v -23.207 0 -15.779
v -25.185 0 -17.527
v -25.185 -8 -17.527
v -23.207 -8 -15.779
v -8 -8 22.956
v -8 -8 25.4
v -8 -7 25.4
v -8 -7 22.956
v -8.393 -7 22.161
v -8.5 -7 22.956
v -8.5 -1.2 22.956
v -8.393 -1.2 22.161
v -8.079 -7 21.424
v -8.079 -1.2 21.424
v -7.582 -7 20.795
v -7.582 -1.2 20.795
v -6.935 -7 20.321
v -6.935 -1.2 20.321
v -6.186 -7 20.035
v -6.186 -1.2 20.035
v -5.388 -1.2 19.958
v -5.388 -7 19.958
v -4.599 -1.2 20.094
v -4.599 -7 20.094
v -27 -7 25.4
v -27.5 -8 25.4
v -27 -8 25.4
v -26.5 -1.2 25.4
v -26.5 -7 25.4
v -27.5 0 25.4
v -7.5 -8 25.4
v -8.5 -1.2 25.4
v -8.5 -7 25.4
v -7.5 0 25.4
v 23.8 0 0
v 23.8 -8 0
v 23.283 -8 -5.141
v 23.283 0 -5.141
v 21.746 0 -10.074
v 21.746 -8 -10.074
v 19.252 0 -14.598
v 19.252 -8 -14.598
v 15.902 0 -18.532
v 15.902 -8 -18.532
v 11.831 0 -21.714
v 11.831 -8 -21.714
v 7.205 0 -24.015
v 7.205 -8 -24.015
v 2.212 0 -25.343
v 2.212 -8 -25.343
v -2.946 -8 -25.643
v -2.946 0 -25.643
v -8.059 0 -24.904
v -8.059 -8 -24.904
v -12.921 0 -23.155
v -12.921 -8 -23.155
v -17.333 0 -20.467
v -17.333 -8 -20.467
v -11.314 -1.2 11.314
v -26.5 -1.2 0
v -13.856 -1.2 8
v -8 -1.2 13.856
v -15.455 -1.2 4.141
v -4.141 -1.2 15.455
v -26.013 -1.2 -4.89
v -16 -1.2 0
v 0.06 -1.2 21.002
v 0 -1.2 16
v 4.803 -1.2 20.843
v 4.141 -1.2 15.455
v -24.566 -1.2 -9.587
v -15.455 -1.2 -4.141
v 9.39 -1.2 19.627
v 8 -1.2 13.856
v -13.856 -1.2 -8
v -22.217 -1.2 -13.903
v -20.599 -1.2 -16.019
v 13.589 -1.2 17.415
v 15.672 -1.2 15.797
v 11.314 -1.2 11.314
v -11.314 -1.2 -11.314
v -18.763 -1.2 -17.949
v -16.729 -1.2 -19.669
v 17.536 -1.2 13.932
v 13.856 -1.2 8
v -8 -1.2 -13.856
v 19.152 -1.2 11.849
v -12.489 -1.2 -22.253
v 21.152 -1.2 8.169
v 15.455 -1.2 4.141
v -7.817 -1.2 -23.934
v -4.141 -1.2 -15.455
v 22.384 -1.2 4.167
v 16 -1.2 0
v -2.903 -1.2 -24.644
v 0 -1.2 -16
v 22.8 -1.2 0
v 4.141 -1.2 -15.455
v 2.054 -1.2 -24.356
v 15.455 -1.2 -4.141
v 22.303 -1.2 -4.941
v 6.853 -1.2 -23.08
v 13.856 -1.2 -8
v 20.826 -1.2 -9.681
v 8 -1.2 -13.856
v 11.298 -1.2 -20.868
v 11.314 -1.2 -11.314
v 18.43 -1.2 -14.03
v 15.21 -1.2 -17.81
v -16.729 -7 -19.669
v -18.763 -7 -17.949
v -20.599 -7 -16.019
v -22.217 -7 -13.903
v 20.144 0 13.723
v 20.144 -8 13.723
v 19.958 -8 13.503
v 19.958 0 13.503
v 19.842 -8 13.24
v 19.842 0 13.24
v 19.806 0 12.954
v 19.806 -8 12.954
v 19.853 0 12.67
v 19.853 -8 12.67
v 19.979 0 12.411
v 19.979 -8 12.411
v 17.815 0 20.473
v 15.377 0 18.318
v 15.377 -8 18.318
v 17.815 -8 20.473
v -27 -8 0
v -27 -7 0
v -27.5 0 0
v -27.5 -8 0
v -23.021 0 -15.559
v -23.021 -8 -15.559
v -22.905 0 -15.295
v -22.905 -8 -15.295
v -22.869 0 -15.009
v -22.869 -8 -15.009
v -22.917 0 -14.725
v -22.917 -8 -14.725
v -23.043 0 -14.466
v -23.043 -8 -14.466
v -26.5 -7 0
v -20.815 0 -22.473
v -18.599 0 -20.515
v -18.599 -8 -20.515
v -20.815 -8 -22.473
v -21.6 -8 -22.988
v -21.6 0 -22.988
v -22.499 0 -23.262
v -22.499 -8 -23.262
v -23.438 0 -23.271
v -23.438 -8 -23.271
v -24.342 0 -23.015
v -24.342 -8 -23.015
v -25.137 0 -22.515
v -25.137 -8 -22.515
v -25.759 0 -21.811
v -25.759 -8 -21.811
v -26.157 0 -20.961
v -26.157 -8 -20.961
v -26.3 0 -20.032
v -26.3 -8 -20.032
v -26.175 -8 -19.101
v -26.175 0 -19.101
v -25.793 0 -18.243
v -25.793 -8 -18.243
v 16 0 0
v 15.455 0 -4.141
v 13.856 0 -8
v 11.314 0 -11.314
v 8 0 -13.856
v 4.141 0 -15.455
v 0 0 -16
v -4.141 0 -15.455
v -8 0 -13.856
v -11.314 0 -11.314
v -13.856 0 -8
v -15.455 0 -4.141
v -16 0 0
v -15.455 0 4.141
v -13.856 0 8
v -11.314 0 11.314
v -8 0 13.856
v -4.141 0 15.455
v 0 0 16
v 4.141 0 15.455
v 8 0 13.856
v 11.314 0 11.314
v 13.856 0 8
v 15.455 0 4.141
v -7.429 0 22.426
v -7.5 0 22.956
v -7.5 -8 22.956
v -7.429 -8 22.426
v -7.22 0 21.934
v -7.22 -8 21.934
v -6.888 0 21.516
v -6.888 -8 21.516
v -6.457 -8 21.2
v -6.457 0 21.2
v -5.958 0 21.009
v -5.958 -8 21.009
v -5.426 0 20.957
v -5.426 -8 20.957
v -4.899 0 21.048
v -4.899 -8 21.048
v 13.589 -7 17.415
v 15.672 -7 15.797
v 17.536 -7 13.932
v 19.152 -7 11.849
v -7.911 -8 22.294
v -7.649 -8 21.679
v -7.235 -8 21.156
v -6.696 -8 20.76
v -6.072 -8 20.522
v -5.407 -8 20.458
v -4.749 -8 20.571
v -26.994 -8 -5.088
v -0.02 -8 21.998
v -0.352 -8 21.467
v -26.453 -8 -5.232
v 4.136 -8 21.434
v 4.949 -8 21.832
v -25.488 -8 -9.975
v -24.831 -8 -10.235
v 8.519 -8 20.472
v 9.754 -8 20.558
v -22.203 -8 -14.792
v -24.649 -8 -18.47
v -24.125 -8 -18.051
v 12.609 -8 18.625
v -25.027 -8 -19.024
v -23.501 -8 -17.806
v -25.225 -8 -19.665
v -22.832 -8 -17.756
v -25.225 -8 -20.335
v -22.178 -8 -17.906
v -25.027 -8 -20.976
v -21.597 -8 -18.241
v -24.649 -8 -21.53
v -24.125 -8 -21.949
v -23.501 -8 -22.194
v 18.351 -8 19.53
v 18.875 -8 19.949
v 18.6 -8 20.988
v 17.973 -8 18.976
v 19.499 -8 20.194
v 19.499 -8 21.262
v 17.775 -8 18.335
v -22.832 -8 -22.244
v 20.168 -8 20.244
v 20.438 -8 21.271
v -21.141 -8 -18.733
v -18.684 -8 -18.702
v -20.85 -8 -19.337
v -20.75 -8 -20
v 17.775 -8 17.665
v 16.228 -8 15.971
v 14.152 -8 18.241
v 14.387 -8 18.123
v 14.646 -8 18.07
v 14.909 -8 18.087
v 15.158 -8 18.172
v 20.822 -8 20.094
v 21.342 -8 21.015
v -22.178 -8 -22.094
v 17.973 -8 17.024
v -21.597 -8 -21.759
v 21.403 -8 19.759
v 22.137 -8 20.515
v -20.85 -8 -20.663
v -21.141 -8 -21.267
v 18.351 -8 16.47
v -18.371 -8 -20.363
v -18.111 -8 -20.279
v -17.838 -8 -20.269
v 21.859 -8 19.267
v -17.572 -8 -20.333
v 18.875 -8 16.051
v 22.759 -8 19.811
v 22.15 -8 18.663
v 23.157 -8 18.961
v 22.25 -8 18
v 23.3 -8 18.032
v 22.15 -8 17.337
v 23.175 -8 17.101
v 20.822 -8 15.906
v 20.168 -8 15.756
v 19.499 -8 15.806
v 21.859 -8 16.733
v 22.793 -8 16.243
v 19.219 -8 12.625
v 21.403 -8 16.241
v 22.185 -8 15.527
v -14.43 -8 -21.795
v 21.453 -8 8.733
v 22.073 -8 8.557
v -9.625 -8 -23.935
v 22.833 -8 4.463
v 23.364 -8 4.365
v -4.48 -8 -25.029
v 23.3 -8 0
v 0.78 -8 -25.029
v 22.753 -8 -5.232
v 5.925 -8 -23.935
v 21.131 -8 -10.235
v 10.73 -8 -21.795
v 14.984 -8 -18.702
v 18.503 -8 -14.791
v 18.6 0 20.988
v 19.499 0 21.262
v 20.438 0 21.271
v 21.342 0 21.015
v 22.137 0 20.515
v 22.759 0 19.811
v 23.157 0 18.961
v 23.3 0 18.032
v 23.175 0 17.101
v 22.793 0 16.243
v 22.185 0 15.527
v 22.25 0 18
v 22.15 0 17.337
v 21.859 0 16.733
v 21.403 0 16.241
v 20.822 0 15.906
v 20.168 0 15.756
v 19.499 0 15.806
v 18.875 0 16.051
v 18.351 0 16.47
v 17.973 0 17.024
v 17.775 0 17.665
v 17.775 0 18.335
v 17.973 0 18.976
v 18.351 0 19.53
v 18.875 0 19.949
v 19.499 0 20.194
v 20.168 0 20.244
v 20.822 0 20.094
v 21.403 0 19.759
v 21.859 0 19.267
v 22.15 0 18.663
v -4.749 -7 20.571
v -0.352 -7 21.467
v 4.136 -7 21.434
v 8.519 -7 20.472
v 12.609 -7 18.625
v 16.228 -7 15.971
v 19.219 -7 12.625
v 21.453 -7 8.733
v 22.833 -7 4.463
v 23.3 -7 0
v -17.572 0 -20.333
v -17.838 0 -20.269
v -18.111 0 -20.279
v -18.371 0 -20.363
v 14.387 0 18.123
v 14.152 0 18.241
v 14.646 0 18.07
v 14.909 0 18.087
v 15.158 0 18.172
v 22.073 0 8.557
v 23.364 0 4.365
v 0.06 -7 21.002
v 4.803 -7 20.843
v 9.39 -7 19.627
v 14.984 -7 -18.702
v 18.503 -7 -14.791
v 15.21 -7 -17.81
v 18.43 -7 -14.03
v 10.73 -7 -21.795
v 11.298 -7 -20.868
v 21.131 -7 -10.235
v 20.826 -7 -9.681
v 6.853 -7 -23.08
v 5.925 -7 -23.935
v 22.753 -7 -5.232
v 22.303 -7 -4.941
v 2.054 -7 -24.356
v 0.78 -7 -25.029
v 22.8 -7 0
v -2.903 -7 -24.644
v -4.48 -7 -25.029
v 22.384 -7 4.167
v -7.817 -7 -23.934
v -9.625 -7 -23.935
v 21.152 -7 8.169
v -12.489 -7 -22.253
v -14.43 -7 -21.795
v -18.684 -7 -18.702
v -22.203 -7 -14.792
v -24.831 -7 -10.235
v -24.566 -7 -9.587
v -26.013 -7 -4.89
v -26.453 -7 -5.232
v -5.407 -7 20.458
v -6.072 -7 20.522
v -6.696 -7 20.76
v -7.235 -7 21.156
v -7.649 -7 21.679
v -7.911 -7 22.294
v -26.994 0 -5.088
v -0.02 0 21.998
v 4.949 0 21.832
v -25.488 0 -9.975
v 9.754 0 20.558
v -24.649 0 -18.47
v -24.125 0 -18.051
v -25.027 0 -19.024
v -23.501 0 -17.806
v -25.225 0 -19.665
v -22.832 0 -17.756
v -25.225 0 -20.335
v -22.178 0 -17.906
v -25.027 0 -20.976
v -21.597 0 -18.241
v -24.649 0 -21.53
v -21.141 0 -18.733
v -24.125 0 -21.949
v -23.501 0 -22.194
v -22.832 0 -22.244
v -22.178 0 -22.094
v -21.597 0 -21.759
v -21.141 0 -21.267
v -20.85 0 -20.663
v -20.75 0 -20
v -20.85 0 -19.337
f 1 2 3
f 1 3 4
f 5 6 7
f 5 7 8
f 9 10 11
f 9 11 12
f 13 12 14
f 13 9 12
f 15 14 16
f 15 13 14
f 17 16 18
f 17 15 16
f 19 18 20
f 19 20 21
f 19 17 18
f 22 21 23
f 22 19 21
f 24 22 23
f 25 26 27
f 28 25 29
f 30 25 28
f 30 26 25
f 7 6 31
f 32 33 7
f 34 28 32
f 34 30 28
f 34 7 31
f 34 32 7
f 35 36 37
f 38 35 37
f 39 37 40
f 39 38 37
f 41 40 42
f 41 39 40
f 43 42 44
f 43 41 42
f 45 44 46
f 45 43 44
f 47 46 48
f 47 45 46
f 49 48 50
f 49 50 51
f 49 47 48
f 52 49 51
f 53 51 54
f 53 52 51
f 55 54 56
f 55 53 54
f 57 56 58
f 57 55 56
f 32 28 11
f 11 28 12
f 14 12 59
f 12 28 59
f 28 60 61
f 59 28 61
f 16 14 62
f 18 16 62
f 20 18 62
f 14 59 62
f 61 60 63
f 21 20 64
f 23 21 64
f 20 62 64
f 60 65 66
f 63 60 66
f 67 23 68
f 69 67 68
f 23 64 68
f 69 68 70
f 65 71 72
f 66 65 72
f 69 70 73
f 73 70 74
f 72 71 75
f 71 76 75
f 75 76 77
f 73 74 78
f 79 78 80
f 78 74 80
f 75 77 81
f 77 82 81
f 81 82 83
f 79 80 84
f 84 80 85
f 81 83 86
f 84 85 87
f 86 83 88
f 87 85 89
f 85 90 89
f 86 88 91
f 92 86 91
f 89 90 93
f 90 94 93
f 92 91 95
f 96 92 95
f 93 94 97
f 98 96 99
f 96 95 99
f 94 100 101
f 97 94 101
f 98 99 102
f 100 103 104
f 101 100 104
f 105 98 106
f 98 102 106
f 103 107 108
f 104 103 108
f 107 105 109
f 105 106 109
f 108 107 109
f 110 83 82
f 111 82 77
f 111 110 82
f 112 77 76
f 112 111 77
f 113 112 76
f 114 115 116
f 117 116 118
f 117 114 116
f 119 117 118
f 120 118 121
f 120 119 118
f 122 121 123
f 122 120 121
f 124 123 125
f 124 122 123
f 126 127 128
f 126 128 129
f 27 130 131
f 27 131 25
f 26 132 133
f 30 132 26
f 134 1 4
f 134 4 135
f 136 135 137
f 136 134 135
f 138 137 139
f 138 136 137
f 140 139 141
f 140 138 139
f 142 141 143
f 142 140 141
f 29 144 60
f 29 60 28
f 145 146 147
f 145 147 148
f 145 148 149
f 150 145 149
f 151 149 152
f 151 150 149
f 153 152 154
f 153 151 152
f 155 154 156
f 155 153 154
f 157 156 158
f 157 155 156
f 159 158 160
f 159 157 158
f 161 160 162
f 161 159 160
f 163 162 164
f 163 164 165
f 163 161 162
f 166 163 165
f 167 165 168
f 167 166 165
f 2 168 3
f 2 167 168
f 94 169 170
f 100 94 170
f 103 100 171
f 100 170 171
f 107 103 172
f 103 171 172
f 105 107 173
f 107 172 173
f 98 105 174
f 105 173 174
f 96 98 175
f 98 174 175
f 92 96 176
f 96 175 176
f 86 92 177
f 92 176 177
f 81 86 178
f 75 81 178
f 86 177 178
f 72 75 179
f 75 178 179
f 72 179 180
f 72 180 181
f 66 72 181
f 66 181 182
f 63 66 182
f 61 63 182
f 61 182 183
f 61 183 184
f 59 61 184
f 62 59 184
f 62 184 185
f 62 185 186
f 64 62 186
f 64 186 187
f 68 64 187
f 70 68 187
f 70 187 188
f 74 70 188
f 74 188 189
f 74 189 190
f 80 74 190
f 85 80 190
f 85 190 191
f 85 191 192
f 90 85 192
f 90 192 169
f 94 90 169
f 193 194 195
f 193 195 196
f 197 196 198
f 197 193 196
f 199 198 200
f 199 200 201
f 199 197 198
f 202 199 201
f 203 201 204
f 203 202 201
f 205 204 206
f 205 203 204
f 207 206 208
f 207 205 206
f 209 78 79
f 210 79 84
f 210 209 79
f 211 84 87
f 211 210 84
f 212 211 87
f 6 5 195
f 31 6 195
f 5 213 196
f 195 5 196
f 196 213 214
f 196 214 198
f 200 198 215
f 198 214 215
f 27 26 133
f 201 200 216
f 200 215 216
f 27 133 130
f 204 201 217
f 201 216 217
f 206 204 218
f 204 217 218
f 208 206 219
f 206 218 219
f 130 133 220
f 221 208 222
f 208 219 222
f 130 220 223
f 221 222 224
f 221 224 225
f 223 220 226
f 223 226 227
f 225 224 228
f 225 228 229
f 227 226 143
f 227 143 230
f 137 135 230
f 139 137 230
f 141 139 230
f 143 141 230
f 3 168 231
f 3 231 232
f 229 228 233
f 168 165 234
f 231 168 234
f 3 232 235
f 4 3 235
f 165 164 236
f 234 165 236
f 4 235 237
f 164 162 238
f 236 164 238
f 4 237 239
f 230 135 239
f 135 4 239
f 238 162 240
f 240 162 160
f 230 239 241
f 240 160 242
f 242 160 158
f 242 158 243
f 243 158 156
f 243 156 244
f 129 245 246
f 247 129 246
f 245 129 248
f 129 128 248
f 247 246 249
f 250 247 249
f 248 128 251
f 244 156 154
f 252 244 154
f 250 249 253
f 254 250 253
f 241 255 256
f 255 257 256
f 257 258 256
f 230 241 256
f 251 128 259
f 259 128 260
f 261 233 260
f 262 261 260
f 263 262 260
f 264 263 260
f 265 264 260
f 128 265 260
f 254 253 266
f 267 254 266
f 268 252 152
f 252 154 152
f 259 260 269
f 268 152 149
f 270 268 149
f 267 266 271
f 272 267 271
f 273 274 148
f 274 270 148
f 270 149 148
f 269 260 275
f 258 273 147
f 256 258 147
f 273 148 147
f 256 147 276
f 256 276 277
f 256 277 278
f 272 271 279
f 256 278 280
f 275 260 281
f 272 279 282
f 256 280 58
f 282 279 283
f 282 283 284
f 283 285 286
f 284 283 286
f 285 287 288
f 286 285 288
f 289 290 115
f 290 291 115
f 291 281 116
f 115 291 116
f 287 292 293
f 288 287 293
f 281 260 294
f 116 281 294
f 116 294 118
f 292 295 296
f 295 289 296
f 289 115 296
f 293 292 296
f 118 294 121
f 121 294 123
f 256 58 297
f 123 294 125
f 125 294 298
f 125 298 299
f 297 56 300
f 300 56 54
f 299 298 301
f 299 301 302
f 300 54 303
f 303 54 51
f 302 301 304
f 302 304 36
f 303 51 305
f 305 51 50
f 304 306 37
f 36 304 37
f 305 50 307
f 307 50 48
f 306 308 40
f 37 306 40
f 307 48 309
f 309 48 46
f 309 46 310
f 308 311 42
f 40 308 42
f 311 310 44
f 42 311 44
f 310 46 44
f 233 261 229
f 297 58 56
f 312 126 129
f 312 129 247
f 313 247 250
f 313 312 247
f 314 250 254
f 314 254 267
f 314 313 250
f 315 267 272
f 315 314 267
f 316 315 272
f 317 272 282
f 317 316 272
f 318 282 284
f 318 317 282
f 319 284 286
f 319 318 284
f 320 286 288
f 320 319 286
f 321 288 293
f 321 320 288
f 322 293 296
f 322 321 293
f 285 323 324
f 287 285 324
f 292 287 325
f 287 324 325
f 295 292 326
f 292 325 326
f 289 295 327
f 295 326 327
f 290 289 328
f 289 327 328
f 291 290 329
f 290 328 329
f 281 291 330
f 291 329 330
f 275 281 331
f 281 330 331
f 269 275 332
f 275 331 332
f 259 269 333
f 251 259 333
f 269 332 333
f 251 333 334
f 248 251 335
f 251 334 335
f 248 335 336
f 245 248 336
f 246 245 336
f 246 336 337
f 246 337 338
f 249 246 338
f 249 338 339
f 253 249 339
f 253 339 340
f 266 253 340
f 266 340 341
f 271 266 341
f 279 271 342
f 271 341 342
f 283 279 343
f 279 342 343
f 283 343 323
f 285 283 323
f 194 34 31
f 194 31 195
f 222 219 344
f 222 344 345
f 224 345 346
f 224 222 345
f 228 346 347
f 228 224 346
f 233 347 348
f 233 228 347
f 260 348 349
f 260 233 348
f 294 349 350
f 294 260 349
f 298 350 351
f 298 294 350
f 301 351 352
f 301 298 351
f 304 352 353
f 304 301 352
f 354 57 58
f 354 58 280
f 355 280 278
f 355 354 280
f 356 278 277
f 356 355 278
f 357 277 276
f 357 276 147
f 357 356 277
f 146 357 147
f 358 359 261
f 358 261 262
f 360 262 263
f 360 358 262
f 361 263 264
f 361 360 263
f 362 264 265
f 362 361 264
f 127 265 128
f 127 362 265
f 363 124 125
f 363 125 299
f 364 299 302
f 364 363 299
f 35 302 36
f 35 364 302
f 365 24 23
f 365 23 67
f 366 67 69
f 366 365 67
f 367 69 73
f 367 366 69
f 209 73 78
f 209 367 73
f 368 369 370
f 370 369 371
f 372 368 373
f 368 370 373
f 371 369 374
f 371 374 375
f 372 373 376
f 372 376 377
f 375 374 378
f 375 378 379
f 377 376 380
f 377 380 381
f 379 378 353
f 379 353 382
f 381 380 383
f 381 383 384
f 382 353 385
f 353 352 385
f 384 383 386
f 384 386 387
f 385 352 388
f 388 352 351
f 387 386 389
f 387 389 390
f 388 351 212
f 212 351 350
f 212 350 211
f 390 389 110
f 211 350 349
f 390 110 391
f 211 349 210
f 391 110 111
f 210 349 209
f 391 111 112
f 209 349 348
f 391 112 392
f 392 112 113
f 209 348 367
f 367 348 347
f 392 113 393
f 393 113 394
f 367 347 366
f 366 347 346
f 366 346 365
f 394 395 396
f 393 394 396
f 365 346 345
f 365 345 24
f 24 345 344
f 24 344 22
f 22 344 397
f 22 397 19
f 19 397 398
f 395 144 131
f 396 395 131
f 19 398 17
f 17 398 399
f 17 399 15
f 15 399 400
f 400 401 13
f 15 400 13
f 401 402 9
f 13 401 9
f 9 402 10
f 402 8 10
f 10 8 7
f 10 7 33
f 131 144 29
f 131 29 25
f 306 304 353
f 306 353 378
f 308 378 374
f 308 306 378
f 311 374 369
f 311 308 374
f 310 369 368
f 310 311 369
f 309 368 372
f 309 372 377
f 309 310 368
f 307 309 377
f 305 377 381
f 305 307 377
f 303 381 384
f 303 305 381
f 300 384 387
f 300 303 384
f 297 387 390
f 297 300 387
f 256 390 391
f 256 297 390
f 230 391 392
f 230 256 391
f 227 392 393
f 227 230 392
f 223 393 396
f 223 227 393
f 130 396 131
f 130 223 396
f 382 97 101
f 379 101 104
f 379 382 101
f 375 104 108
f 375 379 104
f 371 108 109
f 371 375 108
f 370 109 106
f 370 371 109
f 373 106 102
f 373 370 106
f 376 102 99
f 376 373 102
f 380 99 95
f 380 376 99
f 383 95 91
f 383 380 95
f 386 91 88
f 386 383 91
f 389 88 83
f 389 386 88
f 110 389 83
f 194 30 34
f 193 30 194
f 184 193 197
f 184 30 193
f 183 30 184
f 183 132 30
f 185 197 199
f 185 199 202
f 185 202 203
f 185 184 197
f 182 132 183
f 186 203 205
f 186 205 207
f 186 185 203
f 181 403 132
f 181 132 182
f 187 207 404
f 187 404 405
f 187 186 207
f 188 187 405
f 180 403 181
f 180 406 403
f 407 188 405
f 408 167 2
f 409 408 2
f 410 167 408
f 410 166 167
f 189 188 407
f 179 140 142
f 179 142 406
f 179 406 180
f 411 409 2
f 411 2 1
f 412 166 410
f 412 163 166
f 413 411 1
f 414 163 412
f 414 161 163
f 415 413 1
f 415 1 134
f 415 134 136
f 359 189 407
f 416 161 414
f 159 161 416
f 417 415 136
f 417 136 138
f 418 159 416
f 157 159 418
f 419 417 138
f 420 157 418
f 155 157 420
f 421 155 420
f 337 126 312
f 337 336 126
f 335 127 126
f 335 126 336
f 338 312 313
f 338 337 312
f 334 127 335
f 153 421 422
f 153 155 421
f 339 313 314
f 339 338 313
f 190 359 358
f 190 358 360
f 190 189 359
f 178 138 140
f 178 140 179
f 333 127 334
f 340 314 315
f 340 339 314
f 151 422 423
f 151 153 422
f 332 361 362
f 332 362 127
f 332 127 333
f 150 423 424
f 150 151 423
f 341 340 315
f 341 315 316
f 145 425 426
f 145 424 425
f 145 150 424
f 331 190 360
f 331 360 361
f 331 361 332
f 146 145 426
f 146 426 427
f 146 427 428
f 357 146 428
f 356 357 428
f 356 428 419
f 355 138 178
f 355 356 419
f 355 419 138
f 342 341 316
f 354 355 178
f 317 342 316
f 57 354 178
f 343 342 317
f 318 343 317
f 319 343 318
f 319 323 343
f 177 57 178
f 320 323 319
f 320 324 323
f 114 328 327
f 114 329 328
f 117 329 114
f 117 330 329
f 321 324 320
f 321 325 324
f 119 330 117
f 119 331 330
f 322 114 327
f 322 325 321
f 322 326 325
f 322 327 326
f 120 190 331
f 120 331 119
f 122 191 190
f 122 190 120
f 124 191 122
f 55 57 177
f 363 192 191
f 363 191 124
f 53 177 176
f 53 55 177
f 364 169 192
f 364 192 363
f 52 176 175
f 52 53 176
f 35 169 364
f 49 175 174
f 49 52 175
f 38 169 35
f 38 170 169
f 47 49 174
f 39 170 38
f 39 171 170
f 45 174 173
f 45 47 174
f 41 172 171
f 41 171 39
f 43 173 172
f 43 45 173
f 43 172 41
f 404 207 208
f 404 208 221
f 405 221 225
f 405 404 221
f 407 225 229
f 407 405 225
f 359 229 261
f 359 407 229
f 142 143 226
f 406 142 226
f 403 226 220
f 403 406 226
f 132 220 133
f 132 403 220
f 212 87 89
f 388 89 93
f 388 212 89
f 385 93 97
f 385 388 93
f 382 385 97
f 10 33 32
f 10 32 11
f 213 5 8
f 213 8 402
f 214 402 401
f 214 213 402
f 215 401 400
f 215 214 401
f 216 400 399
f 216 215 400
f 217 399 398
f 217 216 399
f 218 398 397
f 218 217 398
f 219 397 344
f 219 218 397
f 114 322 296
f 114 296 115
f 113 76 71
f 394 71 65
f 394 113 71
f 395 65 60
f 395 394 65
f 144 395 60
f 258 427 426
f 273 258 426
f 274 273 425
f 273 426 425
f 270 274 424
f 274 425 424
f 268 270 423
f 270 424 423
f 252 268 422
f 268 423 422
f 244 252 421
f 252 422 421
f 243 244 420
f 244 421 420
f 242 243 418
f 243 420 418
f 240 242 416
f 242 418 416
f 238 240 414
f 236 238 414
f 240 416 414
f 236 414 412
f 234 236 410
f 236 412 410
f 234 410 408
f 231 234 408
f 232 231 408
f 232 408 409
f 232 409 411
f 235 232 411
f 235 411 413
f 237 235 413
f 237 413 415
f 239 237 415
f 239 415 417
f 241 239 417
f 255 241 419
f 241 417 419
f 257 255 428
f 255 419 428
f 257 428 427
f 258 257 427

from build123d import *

# Parameters (mm, degrees)
SKETCH_1_R          = 16
SKETCH_1_R_2        = 2.25
EXTRUDE_1_DEPTH     = 8
CUT_EXTRUDE_1_DEPTH = 6.8
CUT_EXTRUDE_8_DEPTH = 1


with BuildPart() as part:
    # Эскиз1 → Бобышка-Вытянуть1 (new body)
    with BuildSketch(Plane(origin=(0, 0, 0), x_dir=(1, 0, 0), z_dir=(0, 1, 0))):
        with BuildLine():
            Line((-27.5, -25.4), (-7.5, -25.4))
            Line((-7.5, -25.4), (-7.5, -22.955849111))
            ThreePointArc((-7.5, -22.955849111), (-6.68281162, -21.343100938), (-4.899043329, -21.048271831))
            ThreePointArc((-4.899043329, -21.048271831), (4.948796089, -21.832347138), (14.151976117, -18.241220202))
            ThreePointArc((14.151976117, -18.241220202), (14.777726241, -18.069792078), (15.376980036, -18.318480053))
            Line((15.376980036, -18.318480053), (17.814747272, -20.472785982))
            ThreePointArc((17.814747272, -20.472785982), (22.472785982, -20.185252728), (22.185252728, -15.527214018))
            Line((22.185252728, -15.527214018), (20.143734708, -13.723081814))
            ThreePointArc((20.143734708, -13.723081814), (19.813719174, -13.098302749), (19.979075206, -12.411340949))
            ThreePointArc((19.979075206, -12.411340949), (22.823148445, -6.493089604), (23.8, 0))
            ThreePointArc((23.8, 0), (9.576401492, 22.98111988), (-17.333078903, 20.466663618))
            ThreePointArc((-17.333078903, 20.466663618), (-17.974550182, 20.264645495), (-18.598905377, 20.514600122))
            Line((-18.598905377, 20.514600122), (-20.814747272, 22.472785982))
            ThreePointArc((-20.814747272, 22.472785982), (-25.472785982, 22.185252728), (-25.185252728, 17.527214018))
            Line((-25.185252728, 17.527214018), (-23.20688118, 15.778885673))
            ThreePointArc((-23.20688118, 15.778885673), (-22.876796583, 15.153555184), (-23.04284729, 14.466226133))
            ThreePointArc((-23.04284729, 14.466226133), (-26.362874376, 7.569397218), (-27.5, 0))
            Line((-27.5, 0), (-27.5, -25.4))
        make_face()
        Circle(SKETCH_1_R, mode=Mode.SUBTRACT)
        with Locations((-23, 20)):
            Circle(SKETCH_1_R_2, mode=Mode.SUBTRACT)
        with Locations((20, -18)):
            Circle(SKETCH_1_R_2, mode=Mode.SUBTRACT)
    extrude(amount=-EXTRUDE_1_DEPTH)

    # Эскиз2 → Вырез-Вытянуть1 (cut)
    with BuildSketch(Plane(origin=(0, -8, 0), x_dir=(-1, 0, 0), z_dir=(0, -1, 0))):
        with BuildLine():
            Line((8.5, -25.4), (8.5, -22.955849111))
            ThreePointArc((8.5, -22.955849111), (7.274217431, -20.536726851), (4.598564994, -20.094483191))
            ThreePointArc((4.598564994, -20.094483191), (-4.803026036, -20.843028639), (-13.589169994, -17.414631267))
            ThreePointArc((-13.589169994, -17.414631267), (-16.632858543, -14.893819788), (-19.152217909, -11.84892917))
            ThreePointArc((-19.152217909, -11.84892917), (-21.867461922, -6.198703298), (-22.799999997, 0.000326884))
            ThreePointArc((-22.799999997, 0.000326884), (-9.131074658, 22.085751778), (16.729450225, 19.669398029))
            ThreePointArc((16.729450225, 19.669398029), (19.707335368, 17.009099388), (22.216615604, 13.902895678))
            ThreePointArc((22.216615604, 13.902895678), (25.407255273, 7.274792502), (26.500000107, 0.000327424))
            Line((26.500000107, 0.000327424), (26.5, -25.4))
            Line((26.5, -25.4), (8.5, -25.4))
        make_face()
    extrude(amount=-CUT_EXTRUDE_1_DEPTH, mode=Mode.SUBTRACT)

    # Эскиз11 → Вырез-Вытянуть8 (cut)
    with BuildSketch(Plane.XZ.offset(8)):
        with BuildLine():
            Line((-8.5, 22.955849111), (-8.5, 25.4))
            Line((-8.5, 25.4), (-8, 25.4))
            Line((-8, 25.4), (-8, 22.955849111))
            ThreePointArc((-8, 22.955849111), (-6.978514526, 20.939913894), (-4.748804162, 20.571377511))
            ThreePointArc((-4.748804162, 20.571377511), (14.487462515, 17.39189423), (23.3, -0.000122694))
            ThreePointArc((23.3, -0.000122694), (-1.849981151, -25.16680236), (-26.999999983, -0.000160392))
            Line((-26.999999983, -0.000160392), (-27.000000053, 25.4))
            Line((-27.000000053, 25.4), (-26.500000054, 25.4))
            Line((-26.500000054, 25.4), (-26.500000053, -0.000327424))
            ThreePointArc((-26.500000053, -0.000327424), (-1.849999809, -24.666802429), (22.799999998, -0.000327043))
            ThreePointArc((22.799999998, -0.000327043), (14.191842001, 16.98864676), (-4.598564994, 20.094483191))
            ThreePointArc((-4.598564994, 20.094483191), (-7.274217431, 20.536726851), (-8.5, 22.955849111))
        make_face()
    extrude(amount=-CUT_EXTRUDE_8_DEPTH, mode=Mode.SUBTRACT)


solid = part.part
